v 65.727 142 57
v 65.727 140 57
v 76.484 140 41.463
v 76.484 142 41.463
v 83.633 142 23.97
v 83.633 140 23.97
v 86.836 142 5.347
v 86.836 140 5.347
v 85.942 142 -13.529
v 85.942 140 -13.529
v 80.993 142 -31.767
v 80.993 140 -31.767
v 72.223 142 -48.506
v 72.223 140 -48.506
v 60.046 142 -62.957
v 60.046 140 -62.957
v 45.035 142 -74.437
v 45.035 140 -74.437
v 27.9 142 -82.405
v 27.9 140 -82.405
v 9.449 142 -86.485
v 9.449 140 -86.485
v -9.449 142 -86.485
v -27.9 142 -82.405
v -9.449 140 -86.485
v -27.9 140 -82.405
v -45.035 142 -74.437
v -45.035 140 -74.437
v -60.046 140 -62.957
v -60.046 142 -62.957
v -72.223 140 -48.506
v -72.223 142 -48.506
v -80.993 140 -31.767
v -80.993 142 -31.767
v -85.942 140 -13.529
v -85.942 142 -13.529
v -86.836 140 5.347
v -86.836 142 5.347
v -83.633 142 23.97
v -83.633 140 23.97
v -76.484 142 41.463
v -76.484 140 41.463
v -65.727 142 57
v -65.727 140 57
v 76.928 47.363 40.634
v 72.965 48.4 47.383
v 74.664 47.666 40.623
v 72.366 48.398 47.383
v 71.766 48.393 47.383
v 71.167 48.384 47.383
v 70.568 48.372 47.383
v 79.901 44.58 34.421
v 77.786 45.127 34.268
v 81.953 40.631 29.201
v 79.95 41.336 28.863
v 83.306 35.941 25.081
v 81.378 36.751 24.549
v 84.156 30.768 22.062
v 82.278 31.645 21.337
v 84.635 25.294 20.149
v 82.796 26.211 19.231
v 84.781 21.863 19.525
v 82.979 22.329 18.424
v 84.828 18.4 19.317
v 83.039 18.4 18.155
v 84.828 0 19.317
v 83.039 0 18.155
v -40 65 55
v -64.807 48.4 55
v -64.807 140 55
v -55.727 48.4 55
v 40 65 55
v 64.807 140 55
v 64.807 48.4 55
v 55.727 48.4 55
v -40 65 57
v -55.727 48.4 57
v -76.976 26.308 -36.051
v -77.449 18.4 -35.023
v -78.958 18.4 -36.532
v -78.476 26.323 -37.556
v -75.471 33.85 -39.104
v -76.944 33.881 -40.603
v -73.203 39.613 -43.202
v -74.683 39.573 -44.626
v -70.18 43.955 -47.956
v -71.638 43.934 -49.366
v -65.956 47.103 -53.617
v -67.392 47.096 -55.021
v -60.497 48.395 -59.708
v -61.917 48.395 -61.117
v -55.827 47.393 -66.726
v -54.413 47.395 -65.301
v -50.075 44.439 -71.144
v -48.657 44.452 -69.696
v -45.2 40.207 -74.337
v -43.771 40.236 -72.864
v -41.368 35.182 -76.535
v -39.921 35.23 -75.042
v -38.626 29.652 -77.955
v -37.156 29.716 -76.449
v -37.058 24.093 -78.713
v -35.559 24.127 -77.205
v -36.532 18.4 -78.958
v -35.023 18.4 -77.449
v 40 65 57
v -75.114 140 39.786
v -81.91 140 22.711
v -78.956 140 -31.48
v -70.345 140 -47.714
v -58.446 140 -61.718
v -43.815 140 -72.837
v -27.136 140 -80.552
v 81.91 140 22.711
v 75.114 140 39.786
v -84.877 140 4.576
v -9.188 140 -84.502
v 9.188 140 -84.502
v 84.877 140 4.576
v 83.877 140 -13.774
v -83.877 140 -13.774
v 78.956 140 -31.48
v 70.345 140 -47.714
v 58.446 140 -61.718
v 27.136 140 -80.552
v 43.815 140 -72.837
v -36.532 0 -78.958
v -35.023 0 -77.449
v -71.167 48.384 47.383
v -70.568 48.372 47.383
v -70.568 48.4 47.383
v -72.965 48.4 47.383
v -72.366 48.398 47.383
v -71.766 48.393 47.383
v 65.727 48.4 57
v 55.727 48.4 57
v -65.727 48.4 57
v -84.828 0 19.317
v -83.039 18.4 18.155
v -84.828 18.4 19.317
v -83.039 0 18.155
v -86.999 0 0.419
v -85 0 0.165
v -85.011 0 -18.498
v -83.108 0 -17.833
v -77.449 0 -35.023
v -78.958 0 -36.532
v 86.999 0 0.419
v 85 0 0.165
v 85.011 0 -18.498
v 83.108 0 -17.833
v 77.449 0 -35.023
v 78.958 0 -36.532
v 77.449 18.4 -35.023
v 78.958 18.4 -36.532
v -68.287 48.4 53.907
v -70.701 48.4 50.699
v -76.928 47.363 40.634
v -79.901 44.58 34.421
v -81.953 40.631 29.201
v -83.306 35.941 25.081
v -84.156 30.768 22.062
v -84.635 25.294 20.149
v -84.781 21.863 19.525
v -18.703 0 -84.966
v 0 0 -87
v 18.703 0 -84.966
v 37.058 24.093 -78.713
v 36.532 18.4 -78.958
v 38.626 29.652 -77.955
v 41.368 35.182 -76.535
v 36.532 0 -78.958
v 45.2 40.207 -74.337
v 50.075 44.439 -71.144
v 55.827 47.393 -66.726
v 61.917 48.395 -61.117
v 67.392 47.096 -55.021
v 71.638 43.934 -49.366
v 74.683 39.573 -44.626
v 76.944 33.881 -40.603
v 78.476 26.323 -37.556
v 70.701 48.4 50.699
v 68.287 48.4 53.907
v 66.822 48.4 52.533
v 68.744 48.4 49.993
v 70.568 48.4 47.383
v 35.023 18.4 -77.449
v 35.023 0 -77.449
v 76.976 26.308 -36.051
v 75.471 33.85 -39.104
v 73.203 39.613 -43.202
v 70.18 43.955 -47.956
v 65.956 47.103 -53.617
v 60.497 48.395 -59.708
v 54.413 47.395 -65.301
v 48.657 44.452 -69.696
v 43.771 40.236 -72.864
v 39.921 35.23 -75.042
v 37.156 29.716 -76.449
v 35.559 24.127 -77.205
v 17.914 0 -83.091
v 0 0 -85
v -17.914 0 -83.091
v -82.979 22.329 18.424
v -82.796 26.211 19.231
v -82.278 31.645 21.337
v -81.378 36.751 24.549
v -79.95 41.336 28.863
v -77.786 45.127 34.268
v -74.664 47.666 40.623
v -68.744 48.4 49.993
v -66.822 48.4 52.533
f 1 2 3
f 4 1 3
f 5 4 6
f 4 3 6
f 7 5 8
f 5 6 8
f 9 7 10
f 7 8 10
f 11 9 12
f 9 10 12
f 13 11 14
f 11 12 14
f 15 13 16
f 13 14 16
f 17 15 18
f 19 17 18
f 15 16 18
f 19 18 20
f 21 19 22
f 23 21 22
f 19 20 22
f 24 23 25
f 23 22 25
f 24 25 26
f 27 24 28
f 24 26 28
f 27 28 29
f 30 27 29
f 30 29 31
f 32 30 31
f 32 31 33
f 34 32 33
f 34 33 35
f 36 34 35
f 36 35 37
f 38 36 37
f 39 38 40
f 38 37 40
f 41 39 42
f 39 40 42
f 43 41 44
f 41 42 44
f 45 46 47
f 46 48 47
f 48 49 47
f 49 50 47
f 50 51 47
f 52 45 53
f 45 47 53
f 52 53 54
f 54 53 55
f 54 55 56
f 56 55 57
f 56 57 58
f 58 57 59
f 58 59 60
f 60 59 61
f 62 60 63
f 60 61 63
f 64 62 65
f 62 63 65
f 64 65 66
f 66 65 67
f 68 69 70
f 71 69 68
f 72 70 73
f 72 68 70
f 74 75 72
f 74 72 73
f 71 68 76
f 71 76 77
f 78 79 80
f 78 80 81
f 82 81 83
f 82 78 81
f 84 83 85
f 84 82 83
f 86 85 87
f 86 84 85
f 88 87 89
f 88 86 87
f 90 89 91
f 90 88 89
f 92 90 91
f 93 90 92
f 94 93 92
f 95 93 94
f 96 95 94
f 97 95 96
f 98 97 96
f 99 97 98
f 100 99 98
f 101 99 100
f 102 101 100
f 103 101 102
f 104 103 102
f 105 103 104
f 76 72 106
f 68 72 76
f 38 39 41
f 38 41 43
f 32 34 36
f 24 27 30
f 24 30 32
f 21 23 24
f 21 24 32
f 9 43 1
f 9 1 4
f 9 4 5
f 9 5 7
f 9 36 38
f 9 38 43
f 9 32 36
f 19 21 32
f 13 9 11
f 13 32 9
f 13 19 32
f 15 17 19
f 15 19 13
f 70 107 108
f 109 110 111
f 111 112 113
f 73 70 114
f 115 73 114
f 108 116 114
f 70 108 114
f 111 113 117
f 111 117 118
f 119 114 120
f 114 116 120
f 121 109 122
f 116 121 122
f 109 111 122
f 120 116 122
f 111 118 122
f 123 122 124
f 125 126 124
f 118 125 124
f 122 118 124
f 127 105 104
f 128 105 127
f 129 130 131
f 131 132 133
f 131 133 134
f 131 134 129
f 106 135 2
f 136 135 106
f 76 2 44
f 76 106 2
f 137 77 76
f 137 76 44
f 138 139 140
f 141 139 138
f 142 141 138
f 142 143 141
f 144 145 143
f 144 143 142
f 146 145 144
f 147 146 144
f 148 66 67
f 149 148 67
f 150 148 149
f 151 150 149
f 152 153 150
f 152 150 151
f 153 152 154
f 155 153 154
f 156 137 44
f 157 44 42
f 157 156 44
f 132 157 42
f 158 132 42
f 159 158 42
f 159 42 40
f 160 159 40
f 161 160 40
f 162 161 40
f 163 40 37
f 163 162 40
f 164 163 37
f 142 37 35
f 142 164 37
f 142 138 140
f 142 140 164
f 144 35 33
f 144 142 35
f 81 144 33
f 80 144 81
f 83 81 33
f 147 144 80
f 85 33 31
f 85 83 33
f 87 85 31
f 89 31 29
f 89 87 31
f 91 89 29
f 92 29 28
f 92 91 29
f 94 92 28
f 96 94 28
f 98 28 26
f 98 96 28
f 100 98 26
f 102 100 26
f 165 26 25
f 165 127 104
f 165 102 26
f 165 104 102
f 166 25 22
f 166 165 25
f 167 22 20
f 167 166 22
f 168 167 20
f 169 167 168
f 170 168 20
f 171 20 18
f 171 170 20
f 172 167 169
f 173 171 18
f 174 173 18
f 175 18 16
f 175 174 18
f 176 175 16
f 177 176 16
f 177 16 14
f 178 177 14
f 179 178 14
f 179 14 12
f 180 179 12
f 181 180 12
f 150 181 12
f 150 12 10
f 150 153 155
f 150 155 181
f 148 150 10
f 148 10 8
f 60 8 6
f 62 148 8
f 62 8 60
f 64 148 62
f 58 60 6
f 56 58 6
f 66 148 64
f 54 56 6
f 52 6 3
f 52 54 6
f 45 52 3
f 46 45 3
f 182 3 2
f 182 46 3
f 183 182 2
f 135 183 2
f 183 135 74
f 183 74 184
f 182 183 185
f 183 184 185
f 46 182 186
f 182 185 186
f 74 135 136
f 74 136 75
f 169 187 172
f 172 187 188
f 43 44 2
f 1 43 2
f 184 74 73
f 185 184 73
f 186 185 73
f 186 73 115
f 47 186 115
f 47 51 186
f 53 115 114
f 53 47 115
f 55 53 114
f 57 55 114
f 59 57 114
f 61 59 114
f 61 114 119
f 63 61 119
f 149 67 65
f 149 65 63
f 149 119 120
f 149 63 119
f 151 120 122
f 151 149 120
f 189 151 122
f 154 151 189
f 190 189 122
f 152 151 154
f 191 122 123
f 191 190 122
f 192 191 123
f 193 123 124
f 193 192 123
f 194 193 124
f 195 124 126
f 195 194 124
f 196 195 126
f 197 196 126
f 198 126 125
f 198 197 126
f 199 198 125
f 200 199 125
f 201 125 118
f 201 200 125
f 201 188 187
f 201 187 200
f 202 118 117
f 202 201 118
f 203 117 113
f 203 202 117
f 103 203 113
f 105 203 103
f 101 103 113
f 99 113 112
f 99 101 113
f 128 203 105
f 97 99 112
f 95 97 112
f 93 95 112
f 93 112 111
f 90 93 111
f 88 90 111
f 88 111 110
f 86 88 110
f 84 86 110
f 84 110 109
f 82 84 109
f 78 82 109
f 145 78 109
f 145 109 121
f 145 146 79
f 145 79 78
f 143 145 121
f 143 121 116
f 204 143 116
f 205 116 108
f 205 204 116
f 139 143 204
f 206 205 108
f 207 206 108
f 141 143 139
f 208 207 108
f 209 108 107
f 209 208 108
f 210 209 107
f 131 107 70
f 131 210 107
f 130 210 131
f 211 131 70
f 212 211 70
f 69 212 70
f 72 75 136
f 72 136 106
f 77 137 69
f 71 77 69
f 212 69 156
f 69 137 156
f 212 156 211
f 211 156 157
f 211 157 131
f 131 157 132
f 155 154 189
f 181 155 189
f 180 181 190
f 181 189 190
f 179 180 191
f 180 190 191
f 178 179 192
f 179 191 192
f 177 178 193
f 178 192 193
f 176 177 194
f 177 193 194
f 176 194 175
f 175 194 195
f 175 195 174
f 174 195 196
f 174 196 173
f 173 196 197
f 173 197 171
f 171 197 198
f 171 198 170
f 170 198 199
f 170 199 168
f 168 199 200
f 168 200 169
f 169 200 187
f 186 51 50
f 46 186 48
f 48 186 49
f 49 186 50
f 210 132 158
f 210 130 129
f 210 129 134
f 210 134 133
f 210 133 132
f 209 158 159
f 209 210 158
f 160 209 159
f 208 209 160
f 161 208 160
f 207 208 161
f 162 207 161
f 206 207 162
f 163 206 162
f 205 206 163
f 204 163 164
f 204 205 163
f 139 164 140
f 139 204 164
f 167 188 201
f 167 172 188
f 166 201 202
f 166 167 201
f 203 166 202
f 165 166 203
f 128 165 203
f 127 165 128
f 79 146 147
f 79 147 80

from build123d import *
from build123d.topology import SkipClean

# Parameters (mm, degrees)
BOSS_EXTRUDE1_DEPTH       = 140
BOSS_EXTRUDE2_DEPTH       = 2
CUT_EXTRUDE1_REACH        = 189.888
CUT_EXTRUDE1_END_RADIUS   = 87
CIRPATTERN1_COUNT         = 2
CIRPATTERN1_ANGLE         = 78
MIRROR1_COPY_1_REACH      = 189.888
MIRROR1_COPY_1_END_RADIUS = 87
CUT_EXTRUDE3_START        = -72.96499449
CUT_EXTRUDE3_OUTLINE_W    = 9.617412702
CUT_EXTRUDE3_OUTLINE_H    = 48.400041505
CUT_EXTRUDE3_DEPTH        = 145.92998898
CUT_EXTRUDE2_START        = -2
CUT_EXTRUDE2_DEPTH        = 2


# Read off the part's stored shape, not the designer's step: Cut-Extrude3, Cut-Extrude2
with BuildPart() as part:
    # Sketch1 → Boss-Extrude1 (new body)
    with BuildSketch(Plane(origin=(0, 0, 0), x_dir=(1, 0, 0), z_dir=(0, 1, 0))):
        with BuildLine():
            Line((65.726706901, -57), (-65.726706901, -57))
            ThreePointArc((-65.726706901, -57), (0, 87), (65.726706901, -57))
        make_face()
        with BuildLine():
            Line((-64.807406984, -55), (64.807406984, -55))
            ThreePointArc((64.807406984, -55), (0, 85), (-64.807406984, -55))
        make_face(mode=Mode.SUBTRACT)
    extrude(amount=BOSS_EXTRUDE1_DEPTH)

    # Sketch2 → Boss-Extrude2 (add)
    with SkipClean():  # the faces are left unmerged after this step: merging them gives an invalid solid
        with BuildSketch(Plane(origin=(0, 140, 0), x_dir=(1, 0, 0), z_dir=(0, 1, 0))):
            with BuildLine():
                Line((-65.726706901, -57), (65.726706901, -57))
                ThreePointArc((65.726706901, -57), (0, 87), (-65.726706901, -57))
            make_face()
        extrude(amount=BOSS_EXTRUDE2_DEPTH)

    # Cut-Extrude1: up to this cylinder (the profile starts inside it)
    with SkipClean():  # the faces are left unmerged after this step: merging them gives an invalid solid
        cut_extrude1_end = Plane(origin=(0, 9.2, 0), z_dir=(0, -1, 0)) * Cylinder(CUT_EXTRUDE1_END_RADIUS, 554.776, mode=Mode.PRIVATE)
        # Sketch3 → Cut-Extrude1 (cut, up to the surface)
        with BuildSketch(Plane(origin=(0, 0, 0), x_dir=(0.7071067811865464, 0, -0.7071067811865488), z_dir=(0.7071067811865488, 0, 0.7071067811865464)), mode=Mode.PRIVATE) as cut_extrude1_sk1:
            with BuildLine():
                Line((-30, 0), (-30, 18.4))
                ThreePointArc((-30, 18.4), (0, 48.4), (30, 18.4))
                Line((30, 18.4), (30, 0))
                ThreePointArc((30, 0), (0, -30), (-30, 0))
            make_face()
        cut_extrude1_tool1 = extrude(cut_extrude1_sk1.sketch, amount=-CUT_EXTRUDE1_REACH, mode=Mode.PRIVATE) & cut_extrude1_end
        cut_extrude1 = cut_extrude1_tool1.solids().sort_by_distance((0, 9.2, 0))[0]
        add(cut_extrude1, mode=Mode.SUBTRACT)

    # CirPattern1: Cut-Extrude1 ×2 about axis
    with SkipClean():  # the faces are left unmerged after this step: merging them gives an invalid solid
        cirpattern1_axis = Axis((0, 140, 0), (0, 1, 0))
        for i in range(1, CIRPATTERN1_COUNT):
            add(cut_extrude1.rotate(cirpattern1_axis, i * CIRPATTERN1_ANGLE / (CIRPATTERN1_COUNT - 1)), mode=Mode.SUBTRACT)

    # Mirror1: Cut-Extrude1 across plane
    with SkipClean():  # the faces are left unmerged after this step: merging them gives an invalid solid
        add(cut_extrude1.mirror(Plane(origin=(0, 0, 0), x_dir=(0, 0, 1), z_dir=(1, 0, 0))), mode=Mode.SUBTRACT)

    # Mirror1 copy 1: up to this cylinder (the profile starts inside it)
    with SkipClean():  # the faces are left unmerged after this step: merging them gives an invalid solid
        mirror1_copy_1_end = Plane(origin=(0, 9.2, 0), z_dir=(0, -1, 0)) * Cylinder(MIRROR1_COPY_1_END_RADIUS, 554.776, mode=Mode.PRIVATE)
        # Mirror1 copy 1 sketch → Mirror1 copy 1 (cut, up to the surface)
        with BuildSketch(Plane(origin=(0, 0, 0), x_dir=(0.544639035015031, 0, -0.8386705679454215), z_dir=(-0.8386705679454215, 0, -0.544639035015031)), mode=Mode.PRIVATE) as mirror1_copy_1_sk1:
            with BuildLine():
                Line((-30, 0), (-30, -18.4))
                ThreePointArc((-30, -18.4), (0, -48.4), (30, -18.4))
                Line((30, -18.4), (30, 0))
                ThreePointArc((30, 0), (0, 30), (-30, 0))
            make_face()
        mirror1_copy_1_tool1 = extrude(mirror1_copy_1_sk1.sketch, amount=-MIRROR1_COPY_1_REACH, mode=Mode.PRIVATE) & mirror1_copy_1_end
        add(mirror1_copy_1_tool1.solids().sort_by_distance((0, 9.2, 0))[0], mode=Mode.SUBTRACT)

    # Cut-Extrude3 outline → Cut-Extrude3 (cut)
    with SkipClean():  # the faces are left unmerged after this step: merging them gives an invalid solid
        with BuildSketch(Plane(origin=(0, 0, 0), x_dir=(0, 0, -1), z_dir=(1, 0, 0)).offset(CUT_EXTRUDE3_START)):
            with Locations((-52.191293649, 24.200020753)):
                Rectangle(CUT_EXTRUDE3_OUTLINE_W, CUT_EXTRUDE3_OUTLINE_H)
        extrude(amount=CUT_EXTRUDE3_DEPTH, mode=Mode.SUBTRACT)

    # Cut-Extrude2 outline → Cut-Extrude2 (cut)
    with SkipClean():  # the faces are left unmerged after this step: merging them gives an invalid solid
        with BuildSketch(Plane.XY.offset(57).offset(CUT_EXTRUDE2_START)):
            Polygon((-55.726706901, 48.400041505), (55.726706901, 48.400041505), (40, 65), (-40, 65), align=None)
        extrude(amount=CUT_EXTRUDE2_DEPTH, mode=Mode.SUBTRACT)


solid = part.part
